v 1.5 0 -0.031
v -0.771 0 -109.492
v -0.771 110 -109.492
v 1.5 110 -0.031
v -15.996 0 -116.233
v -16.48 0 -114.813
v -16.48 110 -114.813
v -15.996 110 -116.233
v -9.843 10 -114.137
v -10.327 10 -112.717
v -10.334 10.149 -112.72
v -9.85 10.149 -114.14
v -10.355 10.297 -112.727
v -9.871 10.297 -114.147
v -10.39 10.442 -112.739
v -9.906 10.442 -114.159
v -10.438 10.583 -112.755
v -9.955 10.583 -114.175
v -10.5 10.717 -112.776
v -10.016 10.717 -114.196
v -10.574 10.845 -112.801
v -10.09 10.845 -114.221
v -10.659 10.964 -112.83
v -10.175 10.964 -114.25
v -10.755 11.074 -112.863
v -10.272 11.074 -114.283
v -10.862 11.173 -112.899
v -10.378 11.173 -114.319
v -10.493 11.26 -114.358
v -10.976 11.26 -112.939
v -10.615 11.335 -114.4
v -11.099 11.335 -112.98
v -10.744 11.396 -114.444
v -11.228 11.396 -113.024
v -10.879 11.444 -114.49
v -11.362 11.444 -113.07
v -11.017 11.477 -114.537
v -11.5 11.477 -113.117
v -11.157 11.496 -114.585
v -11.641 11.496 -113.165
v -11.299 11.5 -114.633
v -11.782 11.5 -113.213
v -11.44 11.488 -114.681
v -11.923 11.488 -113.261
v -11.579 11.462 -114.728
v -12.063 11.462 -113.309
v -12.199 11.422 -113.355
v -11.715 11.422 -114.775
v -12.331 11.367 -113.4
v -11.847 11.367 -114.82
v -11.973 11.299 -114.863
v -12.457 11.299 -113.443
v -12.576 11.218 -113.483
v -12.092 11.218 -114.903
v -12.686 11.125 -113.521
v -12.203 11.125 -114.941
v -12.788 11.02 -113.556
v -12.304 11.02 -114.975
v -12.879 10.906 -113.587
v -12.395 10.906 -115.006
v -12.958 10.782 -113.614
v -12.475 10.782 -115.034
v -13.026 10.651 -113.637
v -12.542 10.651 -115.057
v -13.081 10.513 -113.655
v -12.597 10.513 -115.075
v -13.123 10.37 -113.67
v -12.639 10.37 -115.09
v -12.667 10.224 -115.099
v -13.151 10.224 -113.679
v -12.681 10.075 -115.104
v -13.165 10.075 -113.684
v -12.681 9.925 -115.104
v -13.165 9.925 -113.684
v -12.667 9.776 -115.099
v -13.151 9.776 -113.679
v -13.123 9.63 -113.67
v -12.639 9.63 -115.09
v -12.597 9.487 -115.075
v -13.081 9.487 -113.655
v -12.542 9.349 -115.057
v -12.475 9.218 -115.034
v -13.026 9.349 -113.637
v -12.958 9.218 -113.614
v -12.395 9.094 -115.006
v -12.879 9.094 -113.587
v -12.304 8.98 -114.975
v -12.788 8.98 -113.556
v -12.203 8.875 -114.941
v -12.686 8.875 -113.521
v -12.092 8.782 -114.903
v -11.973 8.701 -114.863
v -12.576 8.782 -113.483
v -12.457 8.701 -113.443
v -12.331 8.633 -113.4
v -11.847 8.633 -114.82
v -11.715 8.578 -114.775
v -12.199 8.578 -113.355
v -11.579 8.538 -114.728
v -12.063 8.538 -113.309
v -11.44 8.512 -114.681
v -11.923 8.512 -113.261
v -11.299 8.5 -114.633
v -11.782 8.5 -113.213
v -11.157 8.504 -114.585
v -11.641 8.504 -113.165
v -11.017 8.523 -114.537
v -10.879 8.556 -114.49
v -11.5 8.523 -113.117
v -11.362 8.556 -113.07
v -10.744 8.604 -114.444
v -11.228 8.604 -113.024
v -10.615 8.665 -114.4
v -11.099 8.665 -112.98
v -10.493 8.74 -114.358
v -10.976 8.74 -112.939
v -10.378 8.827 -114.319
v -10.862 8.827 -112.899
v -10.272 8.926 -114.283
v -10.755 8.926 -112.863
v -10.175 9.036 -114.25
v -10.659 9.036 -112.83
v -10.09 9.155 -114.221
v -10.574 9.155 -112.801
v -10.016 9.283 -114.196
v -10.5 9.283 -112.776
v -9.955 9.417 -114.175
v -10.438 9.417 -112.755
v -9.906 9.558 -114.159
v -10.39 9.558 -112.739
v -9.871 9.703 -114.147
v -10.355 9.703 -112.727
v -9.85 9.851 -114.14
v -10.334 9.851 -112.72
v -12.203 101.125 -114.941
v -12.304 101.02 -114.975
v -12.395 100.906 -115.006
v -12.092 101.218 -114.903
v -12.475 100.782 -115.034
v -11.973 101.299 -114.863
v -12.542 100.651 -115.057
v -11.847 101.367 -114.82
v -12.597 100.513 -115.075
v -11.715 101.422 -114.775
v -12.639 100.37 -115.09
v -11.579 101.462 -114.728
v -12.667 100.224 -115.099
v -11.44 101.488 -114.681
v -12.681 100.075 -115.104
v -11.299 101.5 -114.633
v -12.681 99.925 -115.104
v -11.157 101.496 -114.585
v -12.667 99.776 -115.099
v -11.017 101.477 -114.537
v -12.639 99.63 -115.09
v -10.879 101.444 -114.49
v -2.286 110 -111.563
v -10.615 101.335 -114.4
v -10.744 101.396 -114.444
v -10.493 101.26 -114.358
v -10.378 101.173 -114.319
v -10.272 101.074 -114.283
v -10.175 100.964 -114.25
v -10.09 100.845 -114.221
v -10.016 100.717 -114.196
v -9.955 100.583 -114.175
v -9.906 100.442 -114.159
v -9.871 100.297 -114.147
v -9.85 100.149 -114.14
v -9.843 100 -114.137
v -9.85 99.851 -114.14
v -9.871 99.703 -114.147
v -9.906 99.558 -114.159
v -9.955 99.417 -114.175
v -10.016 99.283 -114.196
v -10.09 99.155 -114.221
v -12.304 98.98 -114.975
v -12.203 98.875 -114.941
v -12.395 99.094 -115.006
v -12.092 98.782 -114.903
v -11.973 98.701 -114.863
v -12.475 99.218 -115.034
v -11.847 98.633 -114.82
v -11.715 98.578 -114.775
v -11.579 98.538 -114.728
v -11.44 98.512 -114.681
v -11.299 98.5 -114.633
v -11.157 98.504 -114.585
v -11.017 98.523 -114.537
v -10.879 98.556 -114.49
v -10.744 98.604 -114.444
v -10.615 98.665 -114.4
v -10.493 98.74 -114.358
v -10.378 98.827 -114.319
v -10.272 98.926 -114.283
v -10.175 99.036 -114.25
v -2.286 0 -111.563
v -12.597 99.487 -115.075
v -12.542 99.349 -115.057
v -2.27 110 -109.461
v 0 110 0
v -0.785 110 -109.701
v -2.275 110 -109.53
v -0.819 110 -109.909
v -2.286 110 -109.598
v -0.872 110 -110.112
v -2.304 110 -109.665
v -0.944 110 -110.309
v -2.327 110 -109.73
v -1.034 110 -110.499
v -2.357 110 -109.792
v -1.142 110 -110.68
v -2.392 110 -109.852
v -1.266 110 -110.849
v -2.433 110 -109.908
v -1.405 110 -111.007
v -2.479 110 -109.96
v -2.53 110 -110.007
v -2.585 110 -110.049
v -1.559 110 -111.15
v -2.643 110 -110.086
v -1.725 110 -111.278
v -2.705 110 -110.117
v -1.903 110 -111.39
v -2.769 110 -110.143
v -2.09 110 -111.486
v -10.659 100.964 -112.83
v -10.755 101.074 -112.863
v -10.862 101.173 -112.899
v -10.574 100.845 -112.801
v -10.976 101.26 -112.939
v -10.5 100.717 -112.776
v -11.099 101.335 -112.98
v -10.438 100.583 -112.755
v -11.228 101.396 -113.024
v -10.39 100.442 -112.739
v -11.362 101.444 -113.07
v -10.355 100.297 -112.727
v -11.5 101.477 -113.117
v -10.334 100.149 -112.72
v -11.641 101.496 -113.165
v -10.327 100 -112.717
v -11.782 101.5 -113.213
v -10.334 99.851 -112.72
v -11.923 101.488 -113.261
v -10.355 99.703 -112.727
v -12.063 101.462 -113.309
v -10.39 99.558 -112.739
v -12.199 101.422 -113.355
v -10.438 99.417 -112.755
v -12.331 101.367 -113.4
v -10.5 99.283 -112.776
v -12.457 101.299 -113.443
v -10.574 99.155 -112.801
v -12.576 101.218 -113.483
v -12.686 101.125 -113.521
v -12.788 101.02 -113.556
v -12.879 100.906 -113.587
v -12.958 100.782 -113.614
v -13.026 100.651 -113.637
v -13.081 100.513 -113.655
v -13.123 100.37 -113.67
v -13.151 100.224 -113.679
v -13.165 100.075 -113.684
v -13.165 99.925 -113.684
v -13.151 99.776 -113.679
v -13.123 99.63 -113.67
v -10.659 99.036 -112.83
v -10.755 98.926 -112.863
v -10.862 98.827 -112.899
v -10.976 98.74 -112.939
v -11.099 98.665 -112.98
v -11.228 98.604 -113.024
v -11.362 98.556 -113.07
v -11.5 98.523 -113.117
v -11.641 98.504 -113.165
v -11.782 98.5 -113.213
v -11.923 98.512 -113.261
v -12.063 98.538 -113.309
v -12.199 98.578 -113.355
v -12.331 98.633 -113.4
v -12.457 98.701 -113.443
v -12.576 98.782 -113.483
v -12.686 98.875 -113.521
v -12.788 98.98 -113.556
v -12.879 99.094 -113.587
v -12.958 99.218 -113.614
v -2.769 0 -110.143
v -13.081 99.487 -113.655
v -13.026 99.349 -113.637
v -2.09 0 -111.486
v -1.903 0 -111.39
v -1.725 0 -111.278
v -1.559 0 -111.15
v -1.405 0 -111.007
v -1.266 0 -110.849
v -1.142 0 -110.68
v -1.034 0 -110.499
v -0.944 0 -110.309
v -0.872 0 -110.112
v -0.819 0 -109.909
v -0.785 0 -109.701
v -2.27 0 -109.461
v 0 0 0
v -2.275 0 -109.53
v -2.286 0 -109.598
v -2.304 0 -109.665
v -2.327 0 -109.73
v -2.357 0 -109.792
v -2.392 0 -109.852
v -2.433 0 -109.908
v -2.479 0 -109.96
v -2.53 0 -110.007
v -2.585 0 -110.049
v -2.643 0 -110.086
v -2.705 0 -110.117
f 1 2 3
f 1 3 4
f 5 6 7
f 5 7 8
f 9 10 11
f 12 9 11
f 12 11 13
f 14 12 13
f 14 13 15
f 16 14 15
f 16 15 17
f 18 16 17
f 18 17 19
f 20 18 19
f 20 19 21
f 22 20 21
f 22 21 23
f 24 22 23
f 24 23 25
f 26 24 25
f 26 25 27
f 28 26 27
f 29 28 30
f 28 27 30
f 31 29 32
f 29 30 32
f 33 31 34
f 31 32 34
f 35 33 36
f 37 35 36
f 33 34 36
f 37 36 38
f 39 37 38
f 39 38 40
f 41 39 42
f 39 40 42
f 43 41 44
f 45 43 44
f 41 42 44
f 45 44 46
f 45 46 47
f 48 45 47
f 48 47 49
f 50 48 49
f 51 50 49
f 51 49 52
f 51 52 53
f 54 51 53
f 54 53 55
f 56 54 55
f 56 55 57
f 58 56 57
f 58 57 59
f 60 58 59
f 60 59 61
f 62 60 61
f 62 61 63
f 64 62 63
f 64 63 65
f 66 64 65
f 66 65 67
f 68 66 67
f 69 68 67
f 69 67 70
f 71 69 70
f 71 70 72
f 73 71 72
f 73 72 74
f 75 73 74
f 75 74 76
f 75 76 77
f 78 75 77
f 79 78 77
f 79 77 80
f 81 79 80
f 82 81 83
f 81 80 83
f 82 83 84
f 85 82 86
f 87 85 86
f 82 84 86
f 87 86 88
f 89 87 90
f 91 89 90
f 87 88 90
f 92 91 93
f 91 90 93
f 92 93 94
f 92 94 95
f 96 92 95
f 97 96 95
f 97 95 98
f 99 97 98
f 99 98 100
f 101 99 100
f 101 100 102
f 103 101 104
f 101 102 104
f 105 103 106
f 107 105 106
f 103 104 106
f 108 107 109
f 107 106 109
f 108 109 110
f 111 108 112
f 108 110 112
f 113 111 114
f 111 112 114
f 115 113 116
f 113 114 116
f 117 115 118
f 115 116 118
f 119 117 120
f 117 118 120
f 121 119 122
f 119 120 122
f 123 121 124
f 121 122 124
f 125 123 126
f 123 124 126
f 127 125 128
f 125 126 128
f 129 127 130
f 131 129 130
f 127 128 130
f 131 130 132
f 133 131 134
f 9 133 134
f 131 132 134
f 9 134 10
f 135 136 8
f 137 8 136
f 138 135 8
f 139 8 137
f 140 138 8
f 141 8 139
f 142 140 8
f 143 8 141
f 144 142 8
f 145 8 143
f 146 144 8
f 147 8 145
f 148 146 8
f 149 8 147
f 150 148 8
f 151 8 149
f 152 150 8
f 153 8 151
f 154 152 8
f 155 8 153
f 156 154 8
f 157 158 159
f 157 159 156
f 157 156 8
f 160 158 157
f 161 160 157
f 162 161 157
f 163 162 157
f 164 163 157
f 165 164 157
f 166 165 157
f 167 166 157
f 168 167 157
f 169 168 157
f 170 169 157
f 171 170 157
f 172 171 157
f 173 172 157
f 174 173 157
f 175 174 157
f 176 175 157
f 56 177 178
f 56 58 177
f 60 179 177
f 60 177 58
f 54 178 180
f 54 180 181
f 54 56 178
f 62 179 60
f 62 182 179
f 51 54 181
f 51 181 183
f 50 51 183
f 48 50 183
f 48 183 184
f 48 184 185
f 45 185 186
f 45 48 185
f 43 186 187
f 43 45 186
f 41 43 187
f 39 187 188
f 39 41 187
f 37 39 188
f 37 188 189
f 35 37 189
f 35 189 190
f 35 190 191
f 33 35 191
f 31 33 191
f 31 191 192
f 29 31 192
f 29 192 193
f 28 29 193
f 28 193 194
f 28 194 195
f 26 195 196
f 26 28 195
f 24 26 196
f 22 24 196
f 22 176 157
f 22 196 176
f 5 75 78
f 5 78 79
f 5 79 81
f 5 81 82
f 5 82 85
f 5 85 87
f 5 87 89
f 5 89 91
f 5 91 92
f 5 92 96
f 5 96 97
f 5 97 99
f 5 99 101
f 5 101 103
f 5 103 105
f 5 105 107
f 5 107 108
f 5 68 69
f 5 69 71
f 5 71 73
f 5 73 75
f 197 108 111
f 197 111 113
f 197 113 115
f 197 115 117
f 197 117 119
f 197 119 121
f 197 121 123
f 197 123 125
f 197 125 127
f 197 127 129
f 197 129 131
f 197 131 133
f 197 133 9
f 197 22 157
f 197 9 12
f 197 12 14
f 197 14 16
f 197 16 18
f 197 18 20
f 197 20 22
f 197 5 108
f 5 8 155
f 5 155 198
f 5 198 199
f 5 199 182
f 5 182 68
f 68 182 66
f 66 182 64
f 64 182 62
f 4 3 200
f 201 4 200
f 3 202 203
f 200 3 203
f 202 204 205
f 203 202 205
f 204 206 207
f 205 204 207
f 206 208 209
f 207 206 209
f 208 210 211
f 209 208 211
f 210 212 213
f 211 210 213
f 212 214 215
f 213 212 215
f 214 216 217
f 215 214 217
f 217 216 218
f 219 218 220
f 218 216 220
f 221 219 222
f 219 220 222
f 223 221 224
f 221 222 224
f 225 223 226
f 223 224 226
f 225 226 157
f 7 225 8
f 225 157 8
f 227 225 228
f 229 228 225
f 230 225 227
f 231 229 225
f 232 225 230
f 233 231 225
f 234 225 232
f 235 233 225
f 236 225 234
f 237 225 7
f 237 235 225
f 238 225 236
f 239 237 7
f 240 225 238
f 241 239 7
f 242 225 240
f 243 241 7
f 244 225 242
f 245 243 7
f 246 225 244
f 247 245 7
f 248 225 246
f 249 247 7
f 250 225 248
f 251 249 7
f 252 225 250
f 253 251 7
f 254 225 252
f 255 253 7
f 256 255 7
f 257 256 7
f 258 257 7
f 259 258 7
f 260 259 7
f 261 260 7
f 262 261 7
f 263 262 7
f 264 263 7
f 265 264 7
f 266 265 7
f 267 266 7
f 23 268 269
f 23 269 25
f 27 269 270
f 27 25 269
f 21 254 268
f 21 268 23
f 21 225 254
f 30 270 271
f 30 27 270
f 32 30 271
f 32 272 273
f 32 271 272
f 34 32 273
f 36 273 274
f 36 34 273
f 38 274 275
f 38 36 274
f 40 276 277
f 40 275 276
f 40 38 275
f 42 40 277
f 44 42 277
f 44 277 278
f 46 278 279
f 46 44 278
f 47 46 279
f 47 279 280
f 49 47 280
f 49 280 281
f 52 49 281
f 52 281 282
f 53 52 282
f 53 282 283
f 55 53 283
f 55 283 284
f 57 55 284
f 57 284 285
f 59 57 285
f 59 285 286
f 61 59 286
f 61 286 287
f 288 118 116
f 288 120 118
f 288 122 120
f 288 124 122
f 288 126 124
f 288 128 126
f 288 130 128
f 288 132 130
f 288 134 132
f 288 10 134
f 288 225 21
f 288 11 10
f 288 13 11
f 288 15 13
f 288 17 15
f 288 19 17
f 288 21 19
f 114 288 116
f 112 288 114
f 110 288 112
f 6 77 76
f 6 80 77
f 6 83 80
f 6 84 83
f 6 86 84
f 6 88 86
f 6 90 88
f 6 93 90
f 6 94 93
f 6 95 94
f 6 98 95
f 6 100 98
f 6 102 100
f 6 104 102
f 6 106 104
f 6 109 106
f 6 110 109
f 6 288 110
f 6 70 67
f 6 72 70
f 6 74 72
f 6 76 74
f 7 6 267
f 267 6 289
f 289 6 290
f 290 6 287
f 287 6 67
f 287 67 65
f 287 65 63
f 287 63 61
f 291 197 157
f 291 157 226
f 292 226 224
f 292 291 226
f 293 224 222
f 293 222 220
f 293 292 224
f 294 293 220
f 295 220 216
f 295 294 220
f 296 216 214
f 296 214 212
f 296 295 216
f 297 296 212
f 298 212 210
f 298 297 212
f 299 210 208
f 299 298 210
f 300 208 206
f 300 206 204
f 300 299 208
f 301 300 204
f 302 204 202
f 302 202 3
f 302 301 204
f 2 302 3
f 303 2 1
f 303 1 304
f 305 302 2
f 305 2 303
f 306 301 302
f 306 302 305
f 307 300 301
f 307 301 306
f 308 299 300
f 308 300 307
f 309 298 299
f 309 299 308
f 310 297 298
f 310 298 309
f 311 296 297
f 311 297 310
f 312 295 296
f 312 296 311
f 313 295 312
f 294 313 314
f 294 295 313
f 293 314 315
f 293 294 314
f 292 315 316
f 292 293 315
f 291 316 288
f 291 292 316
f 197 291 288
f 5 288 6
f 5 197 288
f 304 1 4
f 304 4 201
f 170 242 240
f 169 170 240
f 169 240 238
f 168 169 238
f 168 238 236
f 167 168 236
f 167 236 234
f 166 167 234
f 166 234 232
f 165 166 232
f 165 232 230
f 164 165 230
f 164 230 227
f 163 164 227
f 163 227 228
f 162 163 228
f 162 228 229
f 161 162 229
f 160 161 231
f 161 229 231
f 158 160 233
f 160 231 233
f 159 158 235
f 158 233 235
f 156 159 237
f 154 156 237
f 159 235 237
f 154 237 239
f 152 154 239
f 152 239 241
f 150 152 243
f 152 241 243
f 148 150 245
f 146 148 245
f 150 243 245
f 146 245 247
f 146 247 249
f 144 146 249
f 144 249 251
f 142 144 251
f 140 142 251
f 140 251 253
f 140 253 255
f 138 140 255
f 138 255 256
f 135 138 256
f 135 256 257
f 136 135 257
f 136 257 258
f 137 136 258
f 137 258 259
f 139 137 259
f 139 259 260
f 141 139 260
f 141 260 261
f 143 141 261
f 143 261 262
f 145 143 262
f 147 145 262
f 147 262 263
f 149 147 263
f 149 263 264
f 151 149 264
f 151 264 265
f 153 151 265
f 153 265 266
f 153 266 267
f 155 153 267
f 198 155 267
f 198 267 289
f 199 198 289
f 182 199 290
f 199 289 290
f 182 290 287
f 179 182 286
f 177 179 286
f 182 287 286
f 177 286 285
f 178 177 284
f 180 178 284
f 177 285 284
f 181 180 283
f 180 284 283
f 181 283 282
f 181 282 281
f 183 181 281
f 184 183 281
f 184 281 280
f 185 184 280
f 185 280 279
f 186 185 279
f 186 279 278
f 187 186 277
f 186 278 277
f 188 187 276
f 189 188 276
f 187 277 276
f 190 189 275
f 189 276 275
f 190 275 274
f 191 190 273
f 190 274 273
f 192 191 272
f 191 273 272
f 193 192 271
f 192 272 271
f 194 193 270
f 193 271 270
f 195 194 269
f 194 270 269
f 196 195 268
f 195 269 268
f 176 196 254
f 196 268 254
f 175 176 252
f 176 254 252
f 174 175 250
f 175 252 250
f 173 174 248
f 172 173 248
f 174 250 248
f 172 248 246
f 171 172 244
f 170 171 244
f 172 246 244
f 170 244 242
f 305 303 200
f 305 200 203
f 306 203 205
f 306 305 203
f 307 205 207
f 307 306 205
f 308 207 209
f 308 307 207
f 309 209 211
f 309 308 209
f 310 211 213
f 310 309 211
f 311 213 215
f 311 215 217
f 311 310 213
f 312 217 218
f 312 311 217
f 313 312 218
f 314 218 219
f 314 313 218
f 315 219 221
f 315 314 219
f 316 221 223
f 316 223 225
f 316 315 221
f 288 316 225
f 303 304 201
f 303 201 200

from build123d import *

# Parameters (mm, degrees)
BASE_FLANGE1_DEPTH          = 110
F_3_0MM_PRESS_DOWEL_HOLE1_D = 3


# Sheet-metal steps are written as plain solids
with BuildPart() as part:
    # Sketch1 → Base-Flange1 (new body)
    with BuildSketch(Plane(origin=(0, 0, 0), x_dir=(1, 0, 0), z_dir=(0, 1, 0))):
        with BuildLine():
            Line((0, 0), (-2.270295707, 109.460685851))
            ThreePointArc((-2.270295707, 109.460685851), (-2.412240672, 109.880329075), (-2.769212645, 110.142664393))
            Line((-2.769212645, 110.142664393), (-16.479732829, 114.813260902))
            Line((-16.479732829, 114.813260902), (-15.996041521, 116.233135093))
            Line((-15.996041521, 116.233135093), (-2.285521337, 111.562538584))
            ThreePointArc((-2.285521337, 111.562538584), (-1.201617569, 110.765987985), (-0.770618236, 109.491790273))
            Line((-0.770618236, 109.491790273), (1.49967747, 0.031104422))
            Line((1.49967747, 0.031104422), (0, 0))
        make_face()
    extrude(amount=BASE_FLANGE1_DEPTH)

    # Ø3.0mm Press Dowel Hole1 (through all)
    with Locations(Plane(origin=(33.81524251, 0, -99.264529514), x_dir=(-0.9465827940969574, 0, -0.32246087192029516), z_dir=(0.32246087192029516, 0, -0.9465827940969574))):
        with Locations((47.622215766, 10), (47.622215766, 100)):
            Hole(F_3_0MM_PRESS_DOWEL_HOLE1_D / 2)


solid = part.part
